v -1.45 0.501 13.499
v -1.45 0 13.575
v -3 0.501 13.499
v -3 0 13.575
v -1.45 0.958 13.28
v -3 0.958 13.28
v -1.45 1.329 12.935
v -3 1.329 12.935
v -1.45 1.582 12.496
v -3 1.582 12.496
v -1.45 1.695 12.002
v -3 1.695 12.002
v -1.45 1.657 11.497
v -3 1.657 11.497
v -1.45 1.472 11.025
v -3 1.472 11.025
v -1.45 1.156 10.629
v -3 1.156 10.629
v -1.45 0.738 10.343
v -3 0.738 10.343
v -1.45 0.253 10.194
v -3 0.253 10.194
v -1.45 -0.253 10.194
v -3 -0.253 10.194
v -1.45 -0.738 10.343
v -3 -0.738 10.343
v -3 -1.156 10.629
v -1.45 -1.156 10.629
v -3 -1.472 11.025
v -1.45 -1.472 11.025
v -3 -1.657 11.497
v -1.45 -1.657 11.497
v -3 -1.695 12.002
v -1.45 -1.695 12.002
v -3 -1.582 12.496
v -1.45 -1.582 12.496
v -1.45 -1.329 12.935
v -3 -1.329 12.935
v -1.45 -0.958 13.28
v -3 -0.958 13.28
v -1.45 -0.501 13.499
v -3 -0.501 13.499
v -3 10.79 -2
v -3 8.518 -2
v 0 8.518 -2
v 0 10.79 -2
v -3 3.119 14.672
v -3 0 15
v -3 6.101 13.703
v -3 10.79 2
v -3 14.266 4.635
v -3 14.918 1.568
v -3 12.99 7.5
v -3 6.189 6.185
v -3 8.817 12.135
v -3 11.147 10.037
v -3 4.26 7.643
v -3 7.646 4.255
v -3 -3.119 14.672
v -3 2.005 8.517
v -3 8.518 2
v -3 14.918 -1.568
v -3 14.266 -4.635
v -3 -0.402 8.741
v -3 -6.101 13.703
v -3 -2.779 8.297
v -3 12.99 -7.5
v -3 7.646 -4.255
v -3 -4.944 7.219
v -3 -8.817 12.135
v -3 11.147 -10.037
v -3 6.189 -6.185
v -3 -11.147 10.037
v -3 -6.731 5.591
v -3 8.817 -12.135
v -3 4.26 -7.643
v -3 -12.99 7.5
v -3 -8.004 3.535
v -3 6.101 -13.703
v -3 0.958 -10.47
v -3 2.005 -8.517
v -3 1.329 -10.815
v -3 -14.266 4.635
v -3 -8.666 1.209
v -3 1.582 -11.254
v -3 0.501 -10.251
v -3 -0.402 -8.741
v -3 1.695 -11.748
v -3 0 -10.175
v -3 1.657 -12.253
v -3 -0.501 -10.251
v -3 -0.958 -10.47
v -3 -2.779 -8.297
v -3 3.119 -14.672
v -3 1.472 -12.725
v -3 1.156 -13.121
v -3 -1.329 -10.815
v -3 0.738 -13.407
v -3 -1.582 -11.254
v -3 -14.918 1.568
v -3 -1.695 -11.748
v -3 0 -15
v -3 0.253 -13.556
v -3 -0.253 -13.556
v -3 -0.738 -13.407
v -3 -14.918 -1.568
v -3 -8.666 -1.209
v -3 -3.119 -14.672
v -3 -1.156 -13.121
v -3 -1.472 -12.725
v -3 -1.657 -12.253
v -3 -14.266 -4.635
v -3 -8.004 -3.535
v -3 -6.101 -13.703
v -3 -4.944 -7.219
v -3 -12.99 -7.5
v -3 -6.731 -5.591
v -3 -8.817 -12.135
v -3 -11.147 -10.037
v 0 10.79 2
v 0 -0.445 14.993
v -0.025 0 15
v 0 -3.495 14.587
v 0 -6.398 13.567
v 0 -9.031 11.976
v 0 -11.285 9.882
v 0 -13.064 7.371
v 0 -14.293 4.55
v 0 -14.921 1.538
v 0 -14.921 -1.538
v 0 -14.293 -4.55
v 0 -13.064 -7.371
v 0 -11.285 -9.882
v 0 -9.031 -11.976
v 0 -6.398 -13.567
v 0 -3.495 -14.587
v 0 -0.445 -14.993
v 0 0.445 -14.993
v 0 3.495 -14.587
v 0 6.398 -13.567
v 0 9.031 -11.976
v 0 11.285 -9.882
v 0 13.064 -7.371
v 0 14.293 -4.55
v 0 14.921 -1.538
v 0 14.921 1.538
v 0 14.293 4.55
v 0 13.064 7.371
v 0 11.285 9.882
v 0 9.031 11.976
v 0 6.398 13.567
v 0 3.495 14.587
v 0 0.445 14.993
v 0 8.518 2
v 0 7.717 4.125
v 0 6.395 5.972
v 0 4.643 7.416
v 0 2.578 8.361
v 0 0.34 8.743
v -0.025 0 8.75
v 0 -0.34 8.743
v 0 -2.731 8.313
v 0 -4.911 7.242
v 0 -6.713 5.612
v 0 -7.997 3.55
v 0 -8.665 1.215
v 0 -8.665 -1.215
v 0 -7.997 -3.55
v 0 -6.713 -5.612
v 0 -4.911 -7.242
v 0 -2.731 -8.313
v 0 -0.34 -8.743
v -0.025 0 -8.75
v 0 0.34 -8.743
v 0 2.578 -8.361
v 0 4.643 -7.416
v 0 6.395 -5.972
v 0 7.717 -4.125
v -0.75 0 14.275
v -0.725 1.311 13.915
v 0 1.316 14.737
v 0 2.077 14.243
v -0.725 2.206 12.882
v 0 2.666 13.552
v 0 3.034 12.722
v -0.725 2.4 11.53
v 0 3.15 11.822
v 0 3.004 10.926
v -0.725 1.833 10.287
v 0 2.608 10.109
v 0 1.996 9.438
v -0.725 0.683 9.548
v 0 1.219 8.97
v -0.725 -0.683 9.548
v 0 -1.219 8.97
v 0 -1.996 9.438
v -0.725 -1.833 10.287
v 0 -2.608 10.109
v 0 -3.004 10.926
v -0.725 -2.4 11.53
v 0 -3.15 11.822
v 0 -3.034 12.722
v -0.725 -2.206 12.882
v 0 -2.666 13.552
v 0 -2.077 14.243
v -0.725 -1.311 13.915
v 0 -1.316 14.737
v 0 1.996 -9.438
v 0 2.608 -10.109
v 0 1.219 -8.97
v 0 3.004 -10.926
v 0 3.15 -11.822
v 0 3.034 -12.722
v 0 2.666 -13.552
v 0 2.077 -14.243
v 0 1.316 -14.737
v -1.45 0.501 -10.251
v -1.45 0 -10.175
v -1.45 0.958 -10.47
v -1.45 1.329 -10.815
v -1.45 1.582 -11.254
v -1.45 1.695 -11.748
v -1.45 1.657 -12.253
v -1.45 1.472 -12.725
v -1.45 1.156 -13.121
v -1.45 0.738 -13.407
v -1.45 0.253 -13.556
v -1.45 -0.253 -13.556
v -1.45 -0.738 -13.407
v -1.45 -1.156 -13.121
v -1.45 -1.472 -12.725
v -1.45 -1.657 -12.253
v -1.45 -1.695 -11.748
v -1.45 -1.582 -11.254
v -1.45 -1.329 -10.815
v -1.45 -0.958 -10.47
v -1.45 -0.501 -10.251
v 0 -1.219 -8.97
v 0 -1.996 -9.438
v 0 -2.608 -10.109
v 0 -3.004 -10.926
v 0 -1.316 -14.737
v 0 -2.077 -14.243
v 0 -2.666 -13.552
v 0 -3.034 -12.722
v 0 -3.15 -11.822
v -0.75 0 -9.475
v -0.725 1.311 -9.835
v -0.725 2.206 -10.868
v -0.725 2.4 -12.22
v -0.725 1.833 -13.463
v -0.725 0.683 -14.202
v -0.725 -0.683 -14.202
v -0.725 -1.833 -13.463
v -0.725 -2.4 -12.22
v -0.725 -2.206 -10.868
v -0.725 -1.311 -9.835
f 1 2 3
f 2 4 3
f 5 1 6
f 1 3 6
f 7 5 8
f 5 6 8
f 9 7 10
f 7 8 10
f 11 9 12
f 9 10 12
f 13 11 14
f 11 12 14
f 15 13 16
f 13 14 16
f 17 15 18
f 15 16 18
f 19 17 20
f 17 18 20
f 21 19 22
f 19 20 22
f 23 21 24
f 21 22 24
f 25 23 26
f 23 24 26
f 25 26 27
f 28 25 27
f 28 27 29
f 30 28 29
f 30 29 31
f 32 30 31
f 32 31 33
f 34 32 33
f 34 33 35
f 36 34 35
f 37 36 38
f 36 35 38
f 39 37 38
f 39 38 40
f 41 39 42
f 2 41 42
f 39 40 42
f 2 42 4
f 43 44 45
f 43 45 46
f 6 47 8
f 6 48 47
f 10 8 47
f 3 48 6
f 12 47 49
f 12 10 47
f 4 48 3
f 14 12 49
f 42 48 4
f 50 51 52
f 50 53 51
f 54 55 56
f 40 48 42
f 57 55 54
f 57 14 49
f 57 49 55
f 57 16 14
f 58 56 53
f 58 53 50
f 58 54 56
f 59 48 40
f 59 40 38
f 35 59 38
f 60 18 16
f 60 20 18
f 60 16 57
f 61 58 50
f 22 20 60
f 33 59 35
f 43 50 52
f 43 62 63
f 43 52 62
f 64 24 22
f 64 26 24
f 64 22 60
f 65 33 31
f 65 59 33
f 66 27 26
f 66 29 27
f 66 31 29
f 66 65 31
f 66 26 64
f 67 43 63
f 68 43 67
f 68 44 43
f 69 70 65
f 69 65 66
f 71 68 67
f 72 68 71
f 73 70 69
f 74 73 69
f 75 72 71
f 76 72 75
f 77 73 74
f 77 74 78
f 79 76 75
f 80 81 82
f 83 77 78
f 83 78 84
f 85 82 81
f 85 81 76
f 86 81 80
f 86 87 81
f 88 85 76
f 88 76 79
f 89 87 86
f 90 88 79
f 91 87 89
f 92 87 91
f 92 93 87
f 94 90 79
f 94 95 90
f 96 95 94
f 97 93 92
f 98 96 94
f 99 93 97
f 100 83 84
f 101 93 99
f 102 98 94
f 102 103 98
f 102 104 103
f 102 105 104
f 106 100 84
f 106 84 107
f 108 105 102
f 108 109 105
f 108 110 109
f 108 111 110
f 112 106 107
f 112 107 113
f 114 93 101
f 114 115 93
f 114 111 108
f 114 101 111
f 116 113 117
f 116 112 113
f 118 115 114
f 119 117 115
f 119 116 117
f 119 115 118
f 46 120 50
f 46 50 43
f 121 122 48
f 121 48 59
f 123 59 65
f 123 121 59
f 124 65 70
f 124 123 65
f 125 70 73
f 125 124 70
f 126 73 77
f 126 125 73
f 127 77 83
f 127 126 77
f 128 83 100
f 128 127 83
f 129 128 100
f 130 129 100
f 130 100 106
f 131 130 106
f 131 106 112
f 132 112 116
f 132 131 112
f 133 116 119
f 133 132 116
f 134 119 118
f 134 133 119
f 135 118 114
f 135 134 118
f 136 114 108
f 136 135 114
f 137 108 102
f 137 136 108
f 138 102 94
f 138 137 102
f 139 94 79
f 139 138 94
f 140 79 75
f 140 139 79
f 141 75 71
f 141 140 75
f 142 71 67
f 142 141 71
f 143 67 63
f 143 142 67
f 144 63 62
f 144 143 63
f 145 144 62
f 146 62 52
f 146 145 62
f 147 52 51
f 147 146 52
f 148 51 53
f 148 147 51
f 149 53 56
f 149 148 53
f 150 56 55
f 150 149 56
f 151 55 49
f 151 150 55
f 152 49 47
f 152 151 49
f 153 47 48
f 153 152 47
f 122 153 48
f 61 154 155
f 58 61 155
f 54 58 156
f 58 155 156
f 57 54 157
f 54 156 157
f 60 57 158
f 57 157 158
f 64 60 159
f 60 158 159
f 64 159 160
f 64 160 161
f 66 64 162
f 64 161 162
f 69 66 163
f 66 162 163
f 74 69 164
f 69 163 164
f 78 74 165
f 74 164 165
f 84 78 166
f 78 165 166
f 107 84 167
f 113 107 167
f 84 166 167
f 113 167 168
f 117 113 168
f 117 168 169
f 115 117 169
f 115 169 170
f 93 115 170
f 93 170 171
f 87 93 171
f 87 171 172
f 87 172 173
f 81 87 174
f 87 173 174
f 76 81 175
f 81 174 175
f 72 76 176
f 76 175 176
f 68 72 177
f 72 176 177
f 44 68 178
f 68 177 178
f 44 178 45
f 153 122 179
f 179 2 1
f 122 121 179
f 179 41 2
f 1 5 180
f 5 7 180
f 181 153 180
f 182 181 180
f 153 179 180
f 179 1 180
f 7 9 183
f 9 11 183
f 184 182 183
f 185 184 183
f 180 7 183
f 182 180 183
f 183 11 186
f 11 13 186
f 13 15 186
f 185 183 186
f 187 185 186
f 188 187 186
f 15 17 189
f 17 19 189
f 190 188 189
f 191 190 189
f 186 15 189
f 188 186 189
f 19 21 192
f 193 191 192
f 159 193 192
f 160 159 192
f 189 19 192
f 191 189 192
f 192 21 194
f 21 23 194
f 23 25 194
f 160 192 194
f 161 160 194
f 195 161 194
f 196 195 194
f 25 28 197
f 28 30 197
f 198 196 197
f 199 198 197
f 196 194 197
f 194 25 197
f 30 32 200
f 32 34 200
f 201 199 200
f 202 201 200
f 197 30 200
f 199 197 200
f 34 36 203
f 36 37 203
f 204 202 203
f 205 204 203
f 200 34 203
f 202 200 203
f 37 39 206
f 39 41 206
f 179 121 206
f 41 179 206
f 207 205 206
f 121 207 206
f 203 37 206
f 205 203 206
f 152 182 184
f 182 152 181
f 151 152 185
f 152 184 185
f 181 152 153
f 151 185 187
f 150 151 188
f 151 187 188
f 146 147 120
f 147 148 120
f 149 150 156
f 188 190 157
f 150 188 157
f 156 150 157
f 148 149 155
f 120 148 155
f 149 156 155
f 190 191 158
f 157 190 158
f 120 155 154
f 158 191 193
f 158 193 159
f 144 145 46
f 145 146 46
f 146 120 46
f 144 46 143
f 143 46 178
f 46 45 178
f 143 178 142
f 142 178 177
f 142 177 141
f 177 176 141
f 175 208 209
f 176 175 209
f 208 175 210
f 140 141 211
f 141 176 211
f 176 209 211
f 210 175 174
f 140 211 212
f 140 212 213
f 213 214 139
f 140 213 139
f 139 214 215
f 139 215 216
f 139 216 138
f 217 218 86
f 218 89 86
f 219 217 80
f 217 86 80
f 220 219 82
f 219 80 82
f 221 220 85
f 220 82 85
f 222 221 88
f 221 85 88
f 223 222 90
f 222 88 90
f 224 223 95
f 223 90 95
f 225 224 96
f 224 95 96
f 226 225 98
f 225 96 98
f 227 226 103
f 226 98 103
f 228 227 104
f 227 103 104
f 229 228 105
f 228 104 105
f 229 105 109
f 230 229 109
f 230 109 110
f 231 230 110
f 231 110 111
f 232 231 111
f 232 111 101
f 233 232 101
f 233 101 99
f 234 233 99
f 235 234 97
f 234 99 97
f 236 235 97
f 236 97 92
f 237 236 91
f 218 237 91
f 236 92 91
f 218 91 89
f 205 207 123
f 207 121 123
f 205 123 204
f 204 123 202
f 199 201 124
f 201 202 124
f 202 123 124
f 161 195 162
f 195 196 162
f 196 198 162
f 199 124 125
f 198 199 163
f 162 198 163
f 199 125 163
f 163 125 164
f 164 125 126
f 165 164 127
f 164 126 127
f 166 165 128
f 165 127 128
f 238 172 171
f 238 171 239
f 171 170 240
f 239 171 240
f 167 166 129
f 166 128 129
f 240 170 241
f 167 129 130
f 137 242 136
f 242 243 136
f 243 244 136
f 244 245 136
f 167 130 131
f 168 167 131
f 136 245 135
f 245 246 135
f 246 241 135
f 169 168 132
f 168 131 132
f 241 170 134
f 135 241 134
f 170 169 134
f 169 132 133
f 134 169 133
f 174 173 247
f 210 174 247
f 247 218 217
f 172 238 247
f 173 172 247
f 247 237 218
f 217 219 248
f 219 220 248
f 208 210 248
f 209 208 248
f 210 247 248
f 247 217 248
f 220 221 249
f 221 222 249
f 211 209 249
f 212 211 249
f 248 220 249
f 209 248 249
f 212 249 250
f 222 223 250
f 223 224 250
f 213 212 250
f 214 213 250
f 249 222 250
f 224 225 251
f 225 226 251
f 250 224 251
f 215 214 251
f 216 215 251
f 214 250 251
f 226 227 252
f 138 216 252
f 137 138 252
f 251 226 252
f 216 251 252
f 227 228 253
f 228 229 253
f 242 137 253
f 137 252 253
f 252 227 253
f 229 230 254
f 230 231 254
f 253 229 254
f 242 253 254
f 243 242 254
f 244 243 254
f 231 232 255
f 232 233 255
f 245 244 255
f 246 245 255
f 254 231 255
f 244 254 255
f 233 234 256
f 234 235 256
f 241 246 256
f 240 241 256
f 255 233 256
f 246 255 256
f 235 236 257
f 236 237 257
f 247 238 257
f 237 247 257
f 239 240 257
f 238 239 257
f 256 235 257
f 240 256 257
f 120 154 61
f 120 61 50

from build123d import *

# Parameters (mm, degrees)
SKETCH1_W                                           = 3
SKETCH1_H                                           = 6.25
SKETCH2_R                                           = 1.5
SKETCH2_W                                           = 4
SKETCH2_H                                           = 4
CUT_EXTRUDE1_DEPTH                                  = 10
CSK_FOR_M3_COUNTERSUNK_FLAT_HEAD_SCREW1_D           = 3.4
CSK_FOR_M3_COUNTERSUNK_FLAT_HEAD_SCREW1_DEPTH       = 20.003
CSK_FOR_M3_COUNTERSUNK_FLAT_HEAD_SCREW1_CSINK_D     = 6.3
CSK_FOR_M3_COUNTERSUNK_FLAT_HEAD_SCREW1_CSINK_ANGLE = 90
CSK_FOR_M3_COUNTERSUNK_FLAT_HEAD_SCREW1_TIP         = 1.021463052


with BuildPart() as part:
    # Sketch1 → Base-Revolve (revolve)
    with BuildSketch(Plane.XY, mode=Mode.PRIVATE) as base_revolve_sk:
        with Locations((-1.5, 11.875)):
            Rectangle(SKETCH1_W, SKETCH1_H)
    revolve(base_revolve_sk.sketch.rotate(Axis((-34.925, 0, 0), (1, 0, 0)), 90), axis=Axis((-34.925, 0, 0), (1, 0, 0)))

    # Sketch2 → Cut-Extrude1 (cut)
    with BuildSketch(Plane(origin=(0, 0, 0), x_dir=(0, 0, -1), z_dir=(1, 0, 0))):
        with Locations((-11.875, 0)):
            Circle(SKETCH2_R)
        with Locations((11.875, 0)):
            Circle(SKETCH2_R)
        with Locations((0, 8.789946371)):
            Rectangle(SKETCH2_W, SKETCH2_H)
    extrude(amount=-CUT_EXTRUDE1_DEPTH, mode=Mode.SUBTRACT)

    # CSK for M3 Countersunk Flat Head Screw1
    with Locations(Plane(origin=(0, 0, 0), x_dir=(0, 0, -1), z_dir=(1, 0, 0))):
        with Locations((-11.875, 0), (11.875, 0)):
            CounterSinkHole(CSK_FOR_M3_COUNTERSUNK_FLAT_HEAD_SCREW1_D / 2, CSK_FOR_M3_COUNTERSUNK_FLAT_HEAD_SCREW1_CSINK_D / 2, depth=CSK_FOR_M3_COUNTERSUNK_FLAT_HEAD_SCREW1_DEPTH, counter_sink_angle=CSK_FOR_M3_COUNTERSUNK_FLAT_HEAD_SCREW1_CSINK_ANGLE)
            with Locations((0, 0, -(CSK_FOR_M3_COUNTERSUNK_FLAT_HEAD_SCREW1_DEPTH + CSK_FOR_M3_COUNTERSUNK_FLAT_HEAD_SCREW1_TIP / 2))):  # 118° drill point
                Cone(0, CSK_FOR_M3_COUNTERSUNK_FLAT_HEAD_SCREW1_D / 2, CSK_FOR_M3_COUNTERSUNK_FLAT_HEAD_SCREW1_TIP, mode=Mode.SUBTRACT)


solid = part.part
